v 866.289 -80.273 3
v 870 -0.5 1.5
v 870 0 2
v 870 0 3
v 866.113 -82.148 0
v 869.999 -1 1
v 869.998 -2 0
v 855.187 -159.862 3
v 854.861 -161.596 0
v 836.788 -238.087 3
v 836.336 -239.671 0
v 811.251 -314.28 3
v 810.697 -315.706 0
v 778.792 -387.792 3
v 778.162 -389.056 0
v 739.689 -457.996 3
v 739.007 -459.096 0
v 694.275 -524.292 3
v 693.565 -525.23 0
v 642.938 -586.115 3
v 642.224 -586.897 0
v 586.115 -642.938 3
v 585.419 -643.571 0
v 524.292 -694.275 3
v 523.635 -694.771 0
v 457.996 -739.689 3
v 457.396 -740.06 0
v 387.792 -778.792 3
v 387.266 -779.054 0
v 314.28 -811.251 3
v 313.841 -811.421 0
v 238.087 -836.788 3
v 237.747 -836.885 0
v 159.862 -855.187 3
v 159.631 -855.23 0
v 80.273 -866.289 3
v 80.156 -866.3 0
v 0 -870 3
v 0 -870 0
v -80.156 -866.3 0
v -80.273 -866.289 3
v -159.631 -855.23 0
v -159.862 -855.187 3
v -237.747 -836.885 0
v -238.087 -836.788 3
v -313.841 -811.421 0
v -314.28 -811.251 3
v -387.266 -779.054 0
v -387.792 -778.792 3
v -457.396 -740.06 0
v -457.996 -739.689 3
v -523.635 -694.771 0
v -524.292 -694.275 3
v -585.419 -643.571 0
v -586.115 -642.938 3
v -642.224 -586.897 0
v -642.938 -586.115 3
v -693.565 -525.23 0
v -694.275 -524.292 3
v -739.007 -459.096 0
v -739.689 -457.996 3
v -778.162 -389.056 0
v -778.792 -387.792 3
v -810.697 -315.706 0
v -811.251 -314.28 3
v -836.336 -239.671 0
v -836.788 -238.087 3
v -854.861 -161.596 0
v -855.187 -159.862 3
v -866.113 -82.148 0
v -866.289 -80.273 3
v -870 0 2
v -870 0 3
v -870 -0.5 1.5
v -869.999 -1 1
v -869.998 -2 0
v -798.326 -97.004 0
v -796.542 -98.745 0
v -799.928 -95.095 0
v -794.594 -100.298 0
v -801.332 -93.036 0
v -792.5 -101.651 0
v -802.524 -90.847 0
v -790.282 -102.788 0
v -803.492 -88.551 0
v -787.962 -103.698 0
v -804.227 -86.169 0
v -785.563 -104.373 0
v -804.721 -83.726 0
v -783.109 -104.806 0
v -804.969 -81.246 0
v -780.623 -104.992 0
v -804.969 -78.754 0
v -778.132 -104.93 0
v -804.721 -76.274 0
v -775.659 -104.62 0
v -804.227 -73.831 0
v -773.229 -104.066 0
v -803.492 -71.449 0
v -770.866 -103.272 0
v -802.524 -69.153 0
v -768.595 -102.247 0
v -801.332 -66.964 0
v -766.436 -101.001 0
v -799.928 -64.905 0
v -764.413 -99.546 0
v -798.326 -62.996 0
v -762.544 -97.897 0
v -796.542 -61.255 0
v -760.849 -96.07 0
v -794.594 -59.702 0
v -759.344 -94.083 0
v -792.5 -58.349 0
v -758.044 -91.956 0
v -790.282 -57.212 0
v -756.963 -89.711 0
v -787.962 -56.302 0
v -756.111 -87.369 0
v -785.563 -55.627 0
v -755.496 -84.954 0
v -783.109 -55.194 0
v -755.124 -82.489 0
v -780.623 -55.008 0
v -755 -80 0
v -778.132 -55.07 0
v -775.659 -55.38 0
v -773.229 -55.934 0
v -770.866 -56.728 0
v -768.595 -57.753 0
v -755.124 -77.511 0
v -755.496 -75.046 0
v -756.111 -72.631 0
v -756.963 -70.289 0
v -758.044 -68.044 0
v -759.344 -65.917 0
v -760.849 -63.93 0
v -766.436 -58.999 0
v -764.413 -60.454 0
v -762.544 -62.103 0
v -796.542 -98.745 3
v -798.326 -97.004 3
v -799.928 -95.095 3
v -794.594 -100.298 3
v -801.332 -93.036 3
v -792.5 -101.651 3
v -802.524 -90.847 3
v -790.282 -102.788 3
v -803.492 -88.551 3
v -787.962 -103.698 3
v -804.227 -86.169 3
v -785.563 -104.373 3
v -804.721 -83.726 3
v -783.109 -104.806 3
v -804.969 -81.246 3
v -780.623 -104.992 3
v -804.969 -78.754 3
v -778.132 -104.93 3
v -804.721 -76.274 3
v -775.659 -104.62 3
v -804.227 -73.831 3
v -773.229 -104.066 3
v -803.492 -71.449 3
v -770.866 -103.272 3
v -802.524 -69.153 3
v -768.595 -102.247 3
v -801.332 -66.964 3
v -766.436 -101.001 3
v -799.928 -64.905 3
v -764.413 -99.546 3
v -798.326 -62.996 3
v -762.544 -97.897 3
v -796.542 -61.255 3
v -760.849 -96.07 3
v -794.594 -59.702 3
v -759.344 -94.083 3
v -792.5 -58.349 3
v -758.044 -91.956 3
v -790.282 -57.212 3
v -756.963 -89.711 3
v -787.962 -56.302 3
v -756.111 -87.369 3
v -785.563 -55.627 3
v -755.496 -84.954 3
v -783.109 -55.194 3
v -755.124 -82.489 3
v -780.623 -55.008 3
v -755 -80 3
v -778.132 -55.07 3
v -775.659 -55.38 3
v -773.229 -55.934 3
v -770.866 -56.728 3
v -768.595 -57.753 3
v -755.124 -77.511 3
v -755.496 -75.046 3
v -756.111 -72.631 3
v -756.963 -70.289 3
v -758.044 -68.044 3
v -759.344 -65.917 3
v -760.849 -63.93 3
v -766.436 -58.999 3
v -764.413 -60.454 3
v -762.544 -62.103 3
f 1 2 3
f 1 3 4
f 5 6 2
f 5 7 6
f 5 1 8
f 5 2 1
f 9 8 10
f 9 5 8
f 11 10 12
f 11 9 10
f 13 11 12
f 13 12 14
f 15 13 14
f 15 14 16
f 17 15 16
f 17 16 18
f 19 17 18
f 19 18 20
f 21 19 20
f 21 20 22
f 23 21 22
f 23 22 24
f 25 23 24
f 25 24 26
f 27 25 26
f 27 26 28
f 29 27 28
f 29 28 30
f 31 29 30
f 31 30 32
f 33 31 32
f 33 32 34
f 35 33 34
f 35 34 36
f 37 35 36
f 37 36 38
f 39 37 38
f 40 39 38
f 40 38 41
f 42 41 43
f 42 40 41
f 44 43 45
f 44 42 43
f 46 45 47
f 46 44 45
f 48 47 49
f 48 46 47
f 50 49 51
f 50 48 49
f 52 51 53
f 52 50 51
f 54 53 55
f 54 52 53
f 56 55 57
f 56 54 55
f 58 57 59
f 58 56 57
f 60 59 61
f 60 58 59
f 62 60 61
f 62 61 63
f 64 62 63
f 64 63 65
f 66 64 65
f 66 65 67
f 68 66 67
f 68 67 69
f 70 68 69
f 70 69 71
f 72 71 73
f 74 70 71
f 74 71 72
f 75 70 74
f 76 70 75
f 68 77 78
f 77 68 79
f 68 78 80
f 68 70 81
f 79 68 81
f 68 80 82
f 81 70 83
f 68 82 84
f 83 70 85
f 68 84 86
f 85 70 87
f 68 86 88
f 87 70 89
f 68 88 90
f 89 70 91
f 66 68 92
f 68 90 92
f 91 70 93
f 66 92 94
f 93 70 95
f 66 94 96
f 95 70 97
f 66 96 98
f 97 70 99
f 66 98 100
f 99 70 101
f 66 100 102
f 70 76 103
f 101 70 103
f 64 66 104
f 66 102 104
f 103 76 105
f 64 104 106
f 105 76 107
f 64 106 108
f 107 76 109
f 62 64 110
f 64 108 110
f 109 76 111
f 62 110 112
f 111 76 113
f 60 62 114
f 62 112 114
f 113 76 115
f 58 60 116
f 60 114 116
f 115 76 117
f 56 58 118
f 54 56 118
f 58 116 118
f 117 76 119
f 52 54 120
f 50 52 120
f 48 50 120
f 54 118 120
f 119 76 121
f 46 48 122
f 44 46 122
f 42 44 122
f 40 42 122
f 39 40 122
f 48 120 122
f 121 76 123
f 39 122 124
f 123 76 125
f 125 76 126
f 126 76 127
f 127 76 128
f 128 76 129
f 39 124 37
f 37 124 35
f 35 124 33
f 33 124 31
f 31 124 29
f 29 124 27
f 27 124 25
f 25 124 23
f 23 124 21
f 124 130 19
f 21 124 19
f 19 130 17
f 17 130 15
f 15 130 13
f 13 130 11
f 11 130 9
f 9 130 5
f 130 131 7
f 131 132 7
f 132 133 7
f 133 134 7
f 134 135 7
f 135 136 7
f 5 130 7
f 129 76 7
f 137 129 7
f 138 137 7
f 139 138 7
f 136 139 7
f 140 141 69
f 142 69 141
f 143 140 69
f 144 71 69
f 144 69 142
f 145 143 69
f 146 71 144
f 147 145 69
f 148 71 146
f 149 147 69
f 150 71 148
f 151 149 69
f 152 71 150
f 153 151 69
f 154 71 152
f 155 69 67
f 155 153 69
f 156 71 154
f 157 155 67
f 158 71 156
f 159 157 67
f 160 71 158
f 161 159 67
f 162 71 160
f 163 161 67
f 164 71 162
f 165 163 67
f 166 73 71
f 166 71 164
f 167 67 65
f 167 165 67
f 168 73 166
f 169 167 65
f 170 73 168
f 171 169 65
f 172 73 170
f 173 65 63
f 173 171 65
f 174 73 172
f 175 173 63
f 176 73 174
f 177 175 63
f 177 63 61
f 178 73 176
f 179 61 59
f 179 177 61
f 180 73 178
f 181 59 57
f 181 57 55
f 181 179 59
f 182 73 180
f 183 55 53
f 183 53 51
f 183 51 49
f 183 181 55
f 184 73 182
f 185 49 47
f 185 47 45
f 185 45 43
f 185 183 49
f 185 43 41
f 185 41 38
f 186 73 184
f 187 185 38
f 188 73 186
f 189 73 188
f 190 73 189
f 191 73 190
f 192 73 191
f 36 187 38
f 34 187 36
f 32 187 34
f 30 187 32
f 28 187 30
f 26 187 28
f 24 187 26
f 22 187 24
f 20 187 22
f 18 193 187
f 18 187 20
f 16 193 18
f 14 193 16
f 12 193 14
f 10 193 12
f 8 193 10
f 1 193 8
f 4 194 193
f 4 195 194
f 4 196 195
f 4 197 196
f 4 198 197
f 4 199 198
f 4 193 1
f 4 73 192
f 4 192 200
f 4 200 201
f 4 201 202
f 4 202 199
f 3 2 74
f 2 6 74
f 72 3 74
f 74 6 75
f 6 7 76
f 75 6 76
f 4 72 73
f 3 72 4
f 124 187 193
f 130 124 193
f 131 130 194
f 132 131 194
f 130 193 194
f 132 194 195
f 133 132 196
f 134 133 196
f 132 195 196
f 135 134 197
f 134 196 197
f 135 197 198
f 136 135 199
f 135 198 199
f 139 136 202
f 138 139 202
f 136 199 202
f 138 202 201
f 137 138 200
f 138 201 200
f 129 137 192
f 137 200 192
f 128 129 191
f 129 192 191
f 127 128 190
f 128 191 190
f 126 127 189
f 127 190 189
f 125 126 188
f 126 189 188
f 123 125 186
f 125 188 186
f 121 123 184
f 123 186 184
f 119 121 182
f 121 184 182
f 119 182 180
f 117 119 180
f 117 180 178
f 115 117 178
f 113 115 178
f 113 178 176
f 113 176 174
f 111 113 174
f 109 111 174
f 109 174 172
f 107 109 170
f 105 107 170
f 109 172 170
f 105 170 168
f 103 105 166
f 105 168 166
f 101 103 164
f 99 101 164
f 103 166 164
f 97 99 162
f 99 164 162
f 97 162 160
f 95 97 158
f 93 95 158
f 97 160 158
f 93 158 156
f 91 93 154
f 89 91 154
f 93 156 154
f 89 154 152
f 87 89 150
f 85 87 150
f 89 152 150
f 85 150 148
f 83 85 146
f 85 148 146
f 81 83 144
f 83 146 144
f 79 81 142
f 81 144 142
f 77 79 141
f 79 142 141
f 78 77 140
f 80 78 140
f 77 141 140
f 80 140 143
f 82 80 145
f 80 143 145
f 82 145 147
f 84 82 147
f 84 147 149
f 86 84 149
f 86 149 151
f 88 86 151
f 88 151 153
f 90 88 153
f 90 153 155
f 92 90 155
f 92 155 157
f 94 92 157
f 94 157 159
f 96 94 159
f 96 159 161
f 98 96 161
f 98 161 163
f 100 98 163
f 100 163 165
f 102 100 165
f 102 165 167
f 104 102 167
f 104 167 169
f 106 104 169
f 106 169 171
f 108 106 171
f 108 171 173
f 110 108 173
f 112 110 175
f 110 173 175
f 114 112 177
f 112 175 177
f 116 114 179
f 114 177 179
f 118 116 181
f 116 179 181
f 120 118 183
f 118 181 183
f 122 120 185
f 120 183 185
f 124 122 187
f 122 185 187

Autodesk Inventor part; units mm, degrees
ref_plane "YZ Plane" through (0, 0, 0) normal (1, 0, 0) x (0, 1, 0)
ref_plane "XZ Plane" through (0, 0, 0) normal (0, 1, 0) x (-1, 0, 0)
ref_plane "XY Plane" through (0, 0, 0) normal (0, 0, 1) x (1, 0, 0)
sketch "Szkic1" plane through (0, 0, 0) normal (0, 0, 1) x (1, 0, 0)
  arc A0 (-870, 0) -> (870, 0) centre (0, 0) ccw
  line L0 (-870, 0) -> (870, 0)
  dimension "d0" = 1740
extrude "Płyta1" add sketch "Szkic1" along normal blind 3
sketch "Szkic2" plane through (0, 0, 3) normal (0, 0, 1) x (1, 0, 0)
  circle A0 centre (-780, -80) radius 25
  arc A1 (-870, 0) -> (870, 0) centre (0, 0) ccw projected
  dimension "d2" = 50
  dimension "d3" = 80
  dimension "d4" = 780
extrude "Wyciągnięcie proste1" cut sketch "Szkic2" against normal blind 10
chamfer "Faza1" distance 2 angle 45 1 edges at (0, 0, 0)
equation "\"d1\" = Grubość"
equation "\"PromieńGięcia\" = Grubość"
equation "\"SzerokośćGięciaPodcięcia\" = Grubość"
equation "\"GłębokośćGięciaPodcięcia\" = 0.5 * Grubość"
equation "\"RozmiarPodcięciaNarożnika\" = 4 * Grubość"
equation "\"MinimalnaPozostałość\" = 2 * Grubość"
equation "\"PromieńPrzejścia\" = PromieńGięcia"
equation "\"Rozmiar_promienia_Jacobiego\" = PromieńGięcia"
equation "\"Wielk_odstępu\" = Grubość"
equation "\"Grubość\" = 3"
properties part number "fllooor22" material "Stal nierdzewna"
